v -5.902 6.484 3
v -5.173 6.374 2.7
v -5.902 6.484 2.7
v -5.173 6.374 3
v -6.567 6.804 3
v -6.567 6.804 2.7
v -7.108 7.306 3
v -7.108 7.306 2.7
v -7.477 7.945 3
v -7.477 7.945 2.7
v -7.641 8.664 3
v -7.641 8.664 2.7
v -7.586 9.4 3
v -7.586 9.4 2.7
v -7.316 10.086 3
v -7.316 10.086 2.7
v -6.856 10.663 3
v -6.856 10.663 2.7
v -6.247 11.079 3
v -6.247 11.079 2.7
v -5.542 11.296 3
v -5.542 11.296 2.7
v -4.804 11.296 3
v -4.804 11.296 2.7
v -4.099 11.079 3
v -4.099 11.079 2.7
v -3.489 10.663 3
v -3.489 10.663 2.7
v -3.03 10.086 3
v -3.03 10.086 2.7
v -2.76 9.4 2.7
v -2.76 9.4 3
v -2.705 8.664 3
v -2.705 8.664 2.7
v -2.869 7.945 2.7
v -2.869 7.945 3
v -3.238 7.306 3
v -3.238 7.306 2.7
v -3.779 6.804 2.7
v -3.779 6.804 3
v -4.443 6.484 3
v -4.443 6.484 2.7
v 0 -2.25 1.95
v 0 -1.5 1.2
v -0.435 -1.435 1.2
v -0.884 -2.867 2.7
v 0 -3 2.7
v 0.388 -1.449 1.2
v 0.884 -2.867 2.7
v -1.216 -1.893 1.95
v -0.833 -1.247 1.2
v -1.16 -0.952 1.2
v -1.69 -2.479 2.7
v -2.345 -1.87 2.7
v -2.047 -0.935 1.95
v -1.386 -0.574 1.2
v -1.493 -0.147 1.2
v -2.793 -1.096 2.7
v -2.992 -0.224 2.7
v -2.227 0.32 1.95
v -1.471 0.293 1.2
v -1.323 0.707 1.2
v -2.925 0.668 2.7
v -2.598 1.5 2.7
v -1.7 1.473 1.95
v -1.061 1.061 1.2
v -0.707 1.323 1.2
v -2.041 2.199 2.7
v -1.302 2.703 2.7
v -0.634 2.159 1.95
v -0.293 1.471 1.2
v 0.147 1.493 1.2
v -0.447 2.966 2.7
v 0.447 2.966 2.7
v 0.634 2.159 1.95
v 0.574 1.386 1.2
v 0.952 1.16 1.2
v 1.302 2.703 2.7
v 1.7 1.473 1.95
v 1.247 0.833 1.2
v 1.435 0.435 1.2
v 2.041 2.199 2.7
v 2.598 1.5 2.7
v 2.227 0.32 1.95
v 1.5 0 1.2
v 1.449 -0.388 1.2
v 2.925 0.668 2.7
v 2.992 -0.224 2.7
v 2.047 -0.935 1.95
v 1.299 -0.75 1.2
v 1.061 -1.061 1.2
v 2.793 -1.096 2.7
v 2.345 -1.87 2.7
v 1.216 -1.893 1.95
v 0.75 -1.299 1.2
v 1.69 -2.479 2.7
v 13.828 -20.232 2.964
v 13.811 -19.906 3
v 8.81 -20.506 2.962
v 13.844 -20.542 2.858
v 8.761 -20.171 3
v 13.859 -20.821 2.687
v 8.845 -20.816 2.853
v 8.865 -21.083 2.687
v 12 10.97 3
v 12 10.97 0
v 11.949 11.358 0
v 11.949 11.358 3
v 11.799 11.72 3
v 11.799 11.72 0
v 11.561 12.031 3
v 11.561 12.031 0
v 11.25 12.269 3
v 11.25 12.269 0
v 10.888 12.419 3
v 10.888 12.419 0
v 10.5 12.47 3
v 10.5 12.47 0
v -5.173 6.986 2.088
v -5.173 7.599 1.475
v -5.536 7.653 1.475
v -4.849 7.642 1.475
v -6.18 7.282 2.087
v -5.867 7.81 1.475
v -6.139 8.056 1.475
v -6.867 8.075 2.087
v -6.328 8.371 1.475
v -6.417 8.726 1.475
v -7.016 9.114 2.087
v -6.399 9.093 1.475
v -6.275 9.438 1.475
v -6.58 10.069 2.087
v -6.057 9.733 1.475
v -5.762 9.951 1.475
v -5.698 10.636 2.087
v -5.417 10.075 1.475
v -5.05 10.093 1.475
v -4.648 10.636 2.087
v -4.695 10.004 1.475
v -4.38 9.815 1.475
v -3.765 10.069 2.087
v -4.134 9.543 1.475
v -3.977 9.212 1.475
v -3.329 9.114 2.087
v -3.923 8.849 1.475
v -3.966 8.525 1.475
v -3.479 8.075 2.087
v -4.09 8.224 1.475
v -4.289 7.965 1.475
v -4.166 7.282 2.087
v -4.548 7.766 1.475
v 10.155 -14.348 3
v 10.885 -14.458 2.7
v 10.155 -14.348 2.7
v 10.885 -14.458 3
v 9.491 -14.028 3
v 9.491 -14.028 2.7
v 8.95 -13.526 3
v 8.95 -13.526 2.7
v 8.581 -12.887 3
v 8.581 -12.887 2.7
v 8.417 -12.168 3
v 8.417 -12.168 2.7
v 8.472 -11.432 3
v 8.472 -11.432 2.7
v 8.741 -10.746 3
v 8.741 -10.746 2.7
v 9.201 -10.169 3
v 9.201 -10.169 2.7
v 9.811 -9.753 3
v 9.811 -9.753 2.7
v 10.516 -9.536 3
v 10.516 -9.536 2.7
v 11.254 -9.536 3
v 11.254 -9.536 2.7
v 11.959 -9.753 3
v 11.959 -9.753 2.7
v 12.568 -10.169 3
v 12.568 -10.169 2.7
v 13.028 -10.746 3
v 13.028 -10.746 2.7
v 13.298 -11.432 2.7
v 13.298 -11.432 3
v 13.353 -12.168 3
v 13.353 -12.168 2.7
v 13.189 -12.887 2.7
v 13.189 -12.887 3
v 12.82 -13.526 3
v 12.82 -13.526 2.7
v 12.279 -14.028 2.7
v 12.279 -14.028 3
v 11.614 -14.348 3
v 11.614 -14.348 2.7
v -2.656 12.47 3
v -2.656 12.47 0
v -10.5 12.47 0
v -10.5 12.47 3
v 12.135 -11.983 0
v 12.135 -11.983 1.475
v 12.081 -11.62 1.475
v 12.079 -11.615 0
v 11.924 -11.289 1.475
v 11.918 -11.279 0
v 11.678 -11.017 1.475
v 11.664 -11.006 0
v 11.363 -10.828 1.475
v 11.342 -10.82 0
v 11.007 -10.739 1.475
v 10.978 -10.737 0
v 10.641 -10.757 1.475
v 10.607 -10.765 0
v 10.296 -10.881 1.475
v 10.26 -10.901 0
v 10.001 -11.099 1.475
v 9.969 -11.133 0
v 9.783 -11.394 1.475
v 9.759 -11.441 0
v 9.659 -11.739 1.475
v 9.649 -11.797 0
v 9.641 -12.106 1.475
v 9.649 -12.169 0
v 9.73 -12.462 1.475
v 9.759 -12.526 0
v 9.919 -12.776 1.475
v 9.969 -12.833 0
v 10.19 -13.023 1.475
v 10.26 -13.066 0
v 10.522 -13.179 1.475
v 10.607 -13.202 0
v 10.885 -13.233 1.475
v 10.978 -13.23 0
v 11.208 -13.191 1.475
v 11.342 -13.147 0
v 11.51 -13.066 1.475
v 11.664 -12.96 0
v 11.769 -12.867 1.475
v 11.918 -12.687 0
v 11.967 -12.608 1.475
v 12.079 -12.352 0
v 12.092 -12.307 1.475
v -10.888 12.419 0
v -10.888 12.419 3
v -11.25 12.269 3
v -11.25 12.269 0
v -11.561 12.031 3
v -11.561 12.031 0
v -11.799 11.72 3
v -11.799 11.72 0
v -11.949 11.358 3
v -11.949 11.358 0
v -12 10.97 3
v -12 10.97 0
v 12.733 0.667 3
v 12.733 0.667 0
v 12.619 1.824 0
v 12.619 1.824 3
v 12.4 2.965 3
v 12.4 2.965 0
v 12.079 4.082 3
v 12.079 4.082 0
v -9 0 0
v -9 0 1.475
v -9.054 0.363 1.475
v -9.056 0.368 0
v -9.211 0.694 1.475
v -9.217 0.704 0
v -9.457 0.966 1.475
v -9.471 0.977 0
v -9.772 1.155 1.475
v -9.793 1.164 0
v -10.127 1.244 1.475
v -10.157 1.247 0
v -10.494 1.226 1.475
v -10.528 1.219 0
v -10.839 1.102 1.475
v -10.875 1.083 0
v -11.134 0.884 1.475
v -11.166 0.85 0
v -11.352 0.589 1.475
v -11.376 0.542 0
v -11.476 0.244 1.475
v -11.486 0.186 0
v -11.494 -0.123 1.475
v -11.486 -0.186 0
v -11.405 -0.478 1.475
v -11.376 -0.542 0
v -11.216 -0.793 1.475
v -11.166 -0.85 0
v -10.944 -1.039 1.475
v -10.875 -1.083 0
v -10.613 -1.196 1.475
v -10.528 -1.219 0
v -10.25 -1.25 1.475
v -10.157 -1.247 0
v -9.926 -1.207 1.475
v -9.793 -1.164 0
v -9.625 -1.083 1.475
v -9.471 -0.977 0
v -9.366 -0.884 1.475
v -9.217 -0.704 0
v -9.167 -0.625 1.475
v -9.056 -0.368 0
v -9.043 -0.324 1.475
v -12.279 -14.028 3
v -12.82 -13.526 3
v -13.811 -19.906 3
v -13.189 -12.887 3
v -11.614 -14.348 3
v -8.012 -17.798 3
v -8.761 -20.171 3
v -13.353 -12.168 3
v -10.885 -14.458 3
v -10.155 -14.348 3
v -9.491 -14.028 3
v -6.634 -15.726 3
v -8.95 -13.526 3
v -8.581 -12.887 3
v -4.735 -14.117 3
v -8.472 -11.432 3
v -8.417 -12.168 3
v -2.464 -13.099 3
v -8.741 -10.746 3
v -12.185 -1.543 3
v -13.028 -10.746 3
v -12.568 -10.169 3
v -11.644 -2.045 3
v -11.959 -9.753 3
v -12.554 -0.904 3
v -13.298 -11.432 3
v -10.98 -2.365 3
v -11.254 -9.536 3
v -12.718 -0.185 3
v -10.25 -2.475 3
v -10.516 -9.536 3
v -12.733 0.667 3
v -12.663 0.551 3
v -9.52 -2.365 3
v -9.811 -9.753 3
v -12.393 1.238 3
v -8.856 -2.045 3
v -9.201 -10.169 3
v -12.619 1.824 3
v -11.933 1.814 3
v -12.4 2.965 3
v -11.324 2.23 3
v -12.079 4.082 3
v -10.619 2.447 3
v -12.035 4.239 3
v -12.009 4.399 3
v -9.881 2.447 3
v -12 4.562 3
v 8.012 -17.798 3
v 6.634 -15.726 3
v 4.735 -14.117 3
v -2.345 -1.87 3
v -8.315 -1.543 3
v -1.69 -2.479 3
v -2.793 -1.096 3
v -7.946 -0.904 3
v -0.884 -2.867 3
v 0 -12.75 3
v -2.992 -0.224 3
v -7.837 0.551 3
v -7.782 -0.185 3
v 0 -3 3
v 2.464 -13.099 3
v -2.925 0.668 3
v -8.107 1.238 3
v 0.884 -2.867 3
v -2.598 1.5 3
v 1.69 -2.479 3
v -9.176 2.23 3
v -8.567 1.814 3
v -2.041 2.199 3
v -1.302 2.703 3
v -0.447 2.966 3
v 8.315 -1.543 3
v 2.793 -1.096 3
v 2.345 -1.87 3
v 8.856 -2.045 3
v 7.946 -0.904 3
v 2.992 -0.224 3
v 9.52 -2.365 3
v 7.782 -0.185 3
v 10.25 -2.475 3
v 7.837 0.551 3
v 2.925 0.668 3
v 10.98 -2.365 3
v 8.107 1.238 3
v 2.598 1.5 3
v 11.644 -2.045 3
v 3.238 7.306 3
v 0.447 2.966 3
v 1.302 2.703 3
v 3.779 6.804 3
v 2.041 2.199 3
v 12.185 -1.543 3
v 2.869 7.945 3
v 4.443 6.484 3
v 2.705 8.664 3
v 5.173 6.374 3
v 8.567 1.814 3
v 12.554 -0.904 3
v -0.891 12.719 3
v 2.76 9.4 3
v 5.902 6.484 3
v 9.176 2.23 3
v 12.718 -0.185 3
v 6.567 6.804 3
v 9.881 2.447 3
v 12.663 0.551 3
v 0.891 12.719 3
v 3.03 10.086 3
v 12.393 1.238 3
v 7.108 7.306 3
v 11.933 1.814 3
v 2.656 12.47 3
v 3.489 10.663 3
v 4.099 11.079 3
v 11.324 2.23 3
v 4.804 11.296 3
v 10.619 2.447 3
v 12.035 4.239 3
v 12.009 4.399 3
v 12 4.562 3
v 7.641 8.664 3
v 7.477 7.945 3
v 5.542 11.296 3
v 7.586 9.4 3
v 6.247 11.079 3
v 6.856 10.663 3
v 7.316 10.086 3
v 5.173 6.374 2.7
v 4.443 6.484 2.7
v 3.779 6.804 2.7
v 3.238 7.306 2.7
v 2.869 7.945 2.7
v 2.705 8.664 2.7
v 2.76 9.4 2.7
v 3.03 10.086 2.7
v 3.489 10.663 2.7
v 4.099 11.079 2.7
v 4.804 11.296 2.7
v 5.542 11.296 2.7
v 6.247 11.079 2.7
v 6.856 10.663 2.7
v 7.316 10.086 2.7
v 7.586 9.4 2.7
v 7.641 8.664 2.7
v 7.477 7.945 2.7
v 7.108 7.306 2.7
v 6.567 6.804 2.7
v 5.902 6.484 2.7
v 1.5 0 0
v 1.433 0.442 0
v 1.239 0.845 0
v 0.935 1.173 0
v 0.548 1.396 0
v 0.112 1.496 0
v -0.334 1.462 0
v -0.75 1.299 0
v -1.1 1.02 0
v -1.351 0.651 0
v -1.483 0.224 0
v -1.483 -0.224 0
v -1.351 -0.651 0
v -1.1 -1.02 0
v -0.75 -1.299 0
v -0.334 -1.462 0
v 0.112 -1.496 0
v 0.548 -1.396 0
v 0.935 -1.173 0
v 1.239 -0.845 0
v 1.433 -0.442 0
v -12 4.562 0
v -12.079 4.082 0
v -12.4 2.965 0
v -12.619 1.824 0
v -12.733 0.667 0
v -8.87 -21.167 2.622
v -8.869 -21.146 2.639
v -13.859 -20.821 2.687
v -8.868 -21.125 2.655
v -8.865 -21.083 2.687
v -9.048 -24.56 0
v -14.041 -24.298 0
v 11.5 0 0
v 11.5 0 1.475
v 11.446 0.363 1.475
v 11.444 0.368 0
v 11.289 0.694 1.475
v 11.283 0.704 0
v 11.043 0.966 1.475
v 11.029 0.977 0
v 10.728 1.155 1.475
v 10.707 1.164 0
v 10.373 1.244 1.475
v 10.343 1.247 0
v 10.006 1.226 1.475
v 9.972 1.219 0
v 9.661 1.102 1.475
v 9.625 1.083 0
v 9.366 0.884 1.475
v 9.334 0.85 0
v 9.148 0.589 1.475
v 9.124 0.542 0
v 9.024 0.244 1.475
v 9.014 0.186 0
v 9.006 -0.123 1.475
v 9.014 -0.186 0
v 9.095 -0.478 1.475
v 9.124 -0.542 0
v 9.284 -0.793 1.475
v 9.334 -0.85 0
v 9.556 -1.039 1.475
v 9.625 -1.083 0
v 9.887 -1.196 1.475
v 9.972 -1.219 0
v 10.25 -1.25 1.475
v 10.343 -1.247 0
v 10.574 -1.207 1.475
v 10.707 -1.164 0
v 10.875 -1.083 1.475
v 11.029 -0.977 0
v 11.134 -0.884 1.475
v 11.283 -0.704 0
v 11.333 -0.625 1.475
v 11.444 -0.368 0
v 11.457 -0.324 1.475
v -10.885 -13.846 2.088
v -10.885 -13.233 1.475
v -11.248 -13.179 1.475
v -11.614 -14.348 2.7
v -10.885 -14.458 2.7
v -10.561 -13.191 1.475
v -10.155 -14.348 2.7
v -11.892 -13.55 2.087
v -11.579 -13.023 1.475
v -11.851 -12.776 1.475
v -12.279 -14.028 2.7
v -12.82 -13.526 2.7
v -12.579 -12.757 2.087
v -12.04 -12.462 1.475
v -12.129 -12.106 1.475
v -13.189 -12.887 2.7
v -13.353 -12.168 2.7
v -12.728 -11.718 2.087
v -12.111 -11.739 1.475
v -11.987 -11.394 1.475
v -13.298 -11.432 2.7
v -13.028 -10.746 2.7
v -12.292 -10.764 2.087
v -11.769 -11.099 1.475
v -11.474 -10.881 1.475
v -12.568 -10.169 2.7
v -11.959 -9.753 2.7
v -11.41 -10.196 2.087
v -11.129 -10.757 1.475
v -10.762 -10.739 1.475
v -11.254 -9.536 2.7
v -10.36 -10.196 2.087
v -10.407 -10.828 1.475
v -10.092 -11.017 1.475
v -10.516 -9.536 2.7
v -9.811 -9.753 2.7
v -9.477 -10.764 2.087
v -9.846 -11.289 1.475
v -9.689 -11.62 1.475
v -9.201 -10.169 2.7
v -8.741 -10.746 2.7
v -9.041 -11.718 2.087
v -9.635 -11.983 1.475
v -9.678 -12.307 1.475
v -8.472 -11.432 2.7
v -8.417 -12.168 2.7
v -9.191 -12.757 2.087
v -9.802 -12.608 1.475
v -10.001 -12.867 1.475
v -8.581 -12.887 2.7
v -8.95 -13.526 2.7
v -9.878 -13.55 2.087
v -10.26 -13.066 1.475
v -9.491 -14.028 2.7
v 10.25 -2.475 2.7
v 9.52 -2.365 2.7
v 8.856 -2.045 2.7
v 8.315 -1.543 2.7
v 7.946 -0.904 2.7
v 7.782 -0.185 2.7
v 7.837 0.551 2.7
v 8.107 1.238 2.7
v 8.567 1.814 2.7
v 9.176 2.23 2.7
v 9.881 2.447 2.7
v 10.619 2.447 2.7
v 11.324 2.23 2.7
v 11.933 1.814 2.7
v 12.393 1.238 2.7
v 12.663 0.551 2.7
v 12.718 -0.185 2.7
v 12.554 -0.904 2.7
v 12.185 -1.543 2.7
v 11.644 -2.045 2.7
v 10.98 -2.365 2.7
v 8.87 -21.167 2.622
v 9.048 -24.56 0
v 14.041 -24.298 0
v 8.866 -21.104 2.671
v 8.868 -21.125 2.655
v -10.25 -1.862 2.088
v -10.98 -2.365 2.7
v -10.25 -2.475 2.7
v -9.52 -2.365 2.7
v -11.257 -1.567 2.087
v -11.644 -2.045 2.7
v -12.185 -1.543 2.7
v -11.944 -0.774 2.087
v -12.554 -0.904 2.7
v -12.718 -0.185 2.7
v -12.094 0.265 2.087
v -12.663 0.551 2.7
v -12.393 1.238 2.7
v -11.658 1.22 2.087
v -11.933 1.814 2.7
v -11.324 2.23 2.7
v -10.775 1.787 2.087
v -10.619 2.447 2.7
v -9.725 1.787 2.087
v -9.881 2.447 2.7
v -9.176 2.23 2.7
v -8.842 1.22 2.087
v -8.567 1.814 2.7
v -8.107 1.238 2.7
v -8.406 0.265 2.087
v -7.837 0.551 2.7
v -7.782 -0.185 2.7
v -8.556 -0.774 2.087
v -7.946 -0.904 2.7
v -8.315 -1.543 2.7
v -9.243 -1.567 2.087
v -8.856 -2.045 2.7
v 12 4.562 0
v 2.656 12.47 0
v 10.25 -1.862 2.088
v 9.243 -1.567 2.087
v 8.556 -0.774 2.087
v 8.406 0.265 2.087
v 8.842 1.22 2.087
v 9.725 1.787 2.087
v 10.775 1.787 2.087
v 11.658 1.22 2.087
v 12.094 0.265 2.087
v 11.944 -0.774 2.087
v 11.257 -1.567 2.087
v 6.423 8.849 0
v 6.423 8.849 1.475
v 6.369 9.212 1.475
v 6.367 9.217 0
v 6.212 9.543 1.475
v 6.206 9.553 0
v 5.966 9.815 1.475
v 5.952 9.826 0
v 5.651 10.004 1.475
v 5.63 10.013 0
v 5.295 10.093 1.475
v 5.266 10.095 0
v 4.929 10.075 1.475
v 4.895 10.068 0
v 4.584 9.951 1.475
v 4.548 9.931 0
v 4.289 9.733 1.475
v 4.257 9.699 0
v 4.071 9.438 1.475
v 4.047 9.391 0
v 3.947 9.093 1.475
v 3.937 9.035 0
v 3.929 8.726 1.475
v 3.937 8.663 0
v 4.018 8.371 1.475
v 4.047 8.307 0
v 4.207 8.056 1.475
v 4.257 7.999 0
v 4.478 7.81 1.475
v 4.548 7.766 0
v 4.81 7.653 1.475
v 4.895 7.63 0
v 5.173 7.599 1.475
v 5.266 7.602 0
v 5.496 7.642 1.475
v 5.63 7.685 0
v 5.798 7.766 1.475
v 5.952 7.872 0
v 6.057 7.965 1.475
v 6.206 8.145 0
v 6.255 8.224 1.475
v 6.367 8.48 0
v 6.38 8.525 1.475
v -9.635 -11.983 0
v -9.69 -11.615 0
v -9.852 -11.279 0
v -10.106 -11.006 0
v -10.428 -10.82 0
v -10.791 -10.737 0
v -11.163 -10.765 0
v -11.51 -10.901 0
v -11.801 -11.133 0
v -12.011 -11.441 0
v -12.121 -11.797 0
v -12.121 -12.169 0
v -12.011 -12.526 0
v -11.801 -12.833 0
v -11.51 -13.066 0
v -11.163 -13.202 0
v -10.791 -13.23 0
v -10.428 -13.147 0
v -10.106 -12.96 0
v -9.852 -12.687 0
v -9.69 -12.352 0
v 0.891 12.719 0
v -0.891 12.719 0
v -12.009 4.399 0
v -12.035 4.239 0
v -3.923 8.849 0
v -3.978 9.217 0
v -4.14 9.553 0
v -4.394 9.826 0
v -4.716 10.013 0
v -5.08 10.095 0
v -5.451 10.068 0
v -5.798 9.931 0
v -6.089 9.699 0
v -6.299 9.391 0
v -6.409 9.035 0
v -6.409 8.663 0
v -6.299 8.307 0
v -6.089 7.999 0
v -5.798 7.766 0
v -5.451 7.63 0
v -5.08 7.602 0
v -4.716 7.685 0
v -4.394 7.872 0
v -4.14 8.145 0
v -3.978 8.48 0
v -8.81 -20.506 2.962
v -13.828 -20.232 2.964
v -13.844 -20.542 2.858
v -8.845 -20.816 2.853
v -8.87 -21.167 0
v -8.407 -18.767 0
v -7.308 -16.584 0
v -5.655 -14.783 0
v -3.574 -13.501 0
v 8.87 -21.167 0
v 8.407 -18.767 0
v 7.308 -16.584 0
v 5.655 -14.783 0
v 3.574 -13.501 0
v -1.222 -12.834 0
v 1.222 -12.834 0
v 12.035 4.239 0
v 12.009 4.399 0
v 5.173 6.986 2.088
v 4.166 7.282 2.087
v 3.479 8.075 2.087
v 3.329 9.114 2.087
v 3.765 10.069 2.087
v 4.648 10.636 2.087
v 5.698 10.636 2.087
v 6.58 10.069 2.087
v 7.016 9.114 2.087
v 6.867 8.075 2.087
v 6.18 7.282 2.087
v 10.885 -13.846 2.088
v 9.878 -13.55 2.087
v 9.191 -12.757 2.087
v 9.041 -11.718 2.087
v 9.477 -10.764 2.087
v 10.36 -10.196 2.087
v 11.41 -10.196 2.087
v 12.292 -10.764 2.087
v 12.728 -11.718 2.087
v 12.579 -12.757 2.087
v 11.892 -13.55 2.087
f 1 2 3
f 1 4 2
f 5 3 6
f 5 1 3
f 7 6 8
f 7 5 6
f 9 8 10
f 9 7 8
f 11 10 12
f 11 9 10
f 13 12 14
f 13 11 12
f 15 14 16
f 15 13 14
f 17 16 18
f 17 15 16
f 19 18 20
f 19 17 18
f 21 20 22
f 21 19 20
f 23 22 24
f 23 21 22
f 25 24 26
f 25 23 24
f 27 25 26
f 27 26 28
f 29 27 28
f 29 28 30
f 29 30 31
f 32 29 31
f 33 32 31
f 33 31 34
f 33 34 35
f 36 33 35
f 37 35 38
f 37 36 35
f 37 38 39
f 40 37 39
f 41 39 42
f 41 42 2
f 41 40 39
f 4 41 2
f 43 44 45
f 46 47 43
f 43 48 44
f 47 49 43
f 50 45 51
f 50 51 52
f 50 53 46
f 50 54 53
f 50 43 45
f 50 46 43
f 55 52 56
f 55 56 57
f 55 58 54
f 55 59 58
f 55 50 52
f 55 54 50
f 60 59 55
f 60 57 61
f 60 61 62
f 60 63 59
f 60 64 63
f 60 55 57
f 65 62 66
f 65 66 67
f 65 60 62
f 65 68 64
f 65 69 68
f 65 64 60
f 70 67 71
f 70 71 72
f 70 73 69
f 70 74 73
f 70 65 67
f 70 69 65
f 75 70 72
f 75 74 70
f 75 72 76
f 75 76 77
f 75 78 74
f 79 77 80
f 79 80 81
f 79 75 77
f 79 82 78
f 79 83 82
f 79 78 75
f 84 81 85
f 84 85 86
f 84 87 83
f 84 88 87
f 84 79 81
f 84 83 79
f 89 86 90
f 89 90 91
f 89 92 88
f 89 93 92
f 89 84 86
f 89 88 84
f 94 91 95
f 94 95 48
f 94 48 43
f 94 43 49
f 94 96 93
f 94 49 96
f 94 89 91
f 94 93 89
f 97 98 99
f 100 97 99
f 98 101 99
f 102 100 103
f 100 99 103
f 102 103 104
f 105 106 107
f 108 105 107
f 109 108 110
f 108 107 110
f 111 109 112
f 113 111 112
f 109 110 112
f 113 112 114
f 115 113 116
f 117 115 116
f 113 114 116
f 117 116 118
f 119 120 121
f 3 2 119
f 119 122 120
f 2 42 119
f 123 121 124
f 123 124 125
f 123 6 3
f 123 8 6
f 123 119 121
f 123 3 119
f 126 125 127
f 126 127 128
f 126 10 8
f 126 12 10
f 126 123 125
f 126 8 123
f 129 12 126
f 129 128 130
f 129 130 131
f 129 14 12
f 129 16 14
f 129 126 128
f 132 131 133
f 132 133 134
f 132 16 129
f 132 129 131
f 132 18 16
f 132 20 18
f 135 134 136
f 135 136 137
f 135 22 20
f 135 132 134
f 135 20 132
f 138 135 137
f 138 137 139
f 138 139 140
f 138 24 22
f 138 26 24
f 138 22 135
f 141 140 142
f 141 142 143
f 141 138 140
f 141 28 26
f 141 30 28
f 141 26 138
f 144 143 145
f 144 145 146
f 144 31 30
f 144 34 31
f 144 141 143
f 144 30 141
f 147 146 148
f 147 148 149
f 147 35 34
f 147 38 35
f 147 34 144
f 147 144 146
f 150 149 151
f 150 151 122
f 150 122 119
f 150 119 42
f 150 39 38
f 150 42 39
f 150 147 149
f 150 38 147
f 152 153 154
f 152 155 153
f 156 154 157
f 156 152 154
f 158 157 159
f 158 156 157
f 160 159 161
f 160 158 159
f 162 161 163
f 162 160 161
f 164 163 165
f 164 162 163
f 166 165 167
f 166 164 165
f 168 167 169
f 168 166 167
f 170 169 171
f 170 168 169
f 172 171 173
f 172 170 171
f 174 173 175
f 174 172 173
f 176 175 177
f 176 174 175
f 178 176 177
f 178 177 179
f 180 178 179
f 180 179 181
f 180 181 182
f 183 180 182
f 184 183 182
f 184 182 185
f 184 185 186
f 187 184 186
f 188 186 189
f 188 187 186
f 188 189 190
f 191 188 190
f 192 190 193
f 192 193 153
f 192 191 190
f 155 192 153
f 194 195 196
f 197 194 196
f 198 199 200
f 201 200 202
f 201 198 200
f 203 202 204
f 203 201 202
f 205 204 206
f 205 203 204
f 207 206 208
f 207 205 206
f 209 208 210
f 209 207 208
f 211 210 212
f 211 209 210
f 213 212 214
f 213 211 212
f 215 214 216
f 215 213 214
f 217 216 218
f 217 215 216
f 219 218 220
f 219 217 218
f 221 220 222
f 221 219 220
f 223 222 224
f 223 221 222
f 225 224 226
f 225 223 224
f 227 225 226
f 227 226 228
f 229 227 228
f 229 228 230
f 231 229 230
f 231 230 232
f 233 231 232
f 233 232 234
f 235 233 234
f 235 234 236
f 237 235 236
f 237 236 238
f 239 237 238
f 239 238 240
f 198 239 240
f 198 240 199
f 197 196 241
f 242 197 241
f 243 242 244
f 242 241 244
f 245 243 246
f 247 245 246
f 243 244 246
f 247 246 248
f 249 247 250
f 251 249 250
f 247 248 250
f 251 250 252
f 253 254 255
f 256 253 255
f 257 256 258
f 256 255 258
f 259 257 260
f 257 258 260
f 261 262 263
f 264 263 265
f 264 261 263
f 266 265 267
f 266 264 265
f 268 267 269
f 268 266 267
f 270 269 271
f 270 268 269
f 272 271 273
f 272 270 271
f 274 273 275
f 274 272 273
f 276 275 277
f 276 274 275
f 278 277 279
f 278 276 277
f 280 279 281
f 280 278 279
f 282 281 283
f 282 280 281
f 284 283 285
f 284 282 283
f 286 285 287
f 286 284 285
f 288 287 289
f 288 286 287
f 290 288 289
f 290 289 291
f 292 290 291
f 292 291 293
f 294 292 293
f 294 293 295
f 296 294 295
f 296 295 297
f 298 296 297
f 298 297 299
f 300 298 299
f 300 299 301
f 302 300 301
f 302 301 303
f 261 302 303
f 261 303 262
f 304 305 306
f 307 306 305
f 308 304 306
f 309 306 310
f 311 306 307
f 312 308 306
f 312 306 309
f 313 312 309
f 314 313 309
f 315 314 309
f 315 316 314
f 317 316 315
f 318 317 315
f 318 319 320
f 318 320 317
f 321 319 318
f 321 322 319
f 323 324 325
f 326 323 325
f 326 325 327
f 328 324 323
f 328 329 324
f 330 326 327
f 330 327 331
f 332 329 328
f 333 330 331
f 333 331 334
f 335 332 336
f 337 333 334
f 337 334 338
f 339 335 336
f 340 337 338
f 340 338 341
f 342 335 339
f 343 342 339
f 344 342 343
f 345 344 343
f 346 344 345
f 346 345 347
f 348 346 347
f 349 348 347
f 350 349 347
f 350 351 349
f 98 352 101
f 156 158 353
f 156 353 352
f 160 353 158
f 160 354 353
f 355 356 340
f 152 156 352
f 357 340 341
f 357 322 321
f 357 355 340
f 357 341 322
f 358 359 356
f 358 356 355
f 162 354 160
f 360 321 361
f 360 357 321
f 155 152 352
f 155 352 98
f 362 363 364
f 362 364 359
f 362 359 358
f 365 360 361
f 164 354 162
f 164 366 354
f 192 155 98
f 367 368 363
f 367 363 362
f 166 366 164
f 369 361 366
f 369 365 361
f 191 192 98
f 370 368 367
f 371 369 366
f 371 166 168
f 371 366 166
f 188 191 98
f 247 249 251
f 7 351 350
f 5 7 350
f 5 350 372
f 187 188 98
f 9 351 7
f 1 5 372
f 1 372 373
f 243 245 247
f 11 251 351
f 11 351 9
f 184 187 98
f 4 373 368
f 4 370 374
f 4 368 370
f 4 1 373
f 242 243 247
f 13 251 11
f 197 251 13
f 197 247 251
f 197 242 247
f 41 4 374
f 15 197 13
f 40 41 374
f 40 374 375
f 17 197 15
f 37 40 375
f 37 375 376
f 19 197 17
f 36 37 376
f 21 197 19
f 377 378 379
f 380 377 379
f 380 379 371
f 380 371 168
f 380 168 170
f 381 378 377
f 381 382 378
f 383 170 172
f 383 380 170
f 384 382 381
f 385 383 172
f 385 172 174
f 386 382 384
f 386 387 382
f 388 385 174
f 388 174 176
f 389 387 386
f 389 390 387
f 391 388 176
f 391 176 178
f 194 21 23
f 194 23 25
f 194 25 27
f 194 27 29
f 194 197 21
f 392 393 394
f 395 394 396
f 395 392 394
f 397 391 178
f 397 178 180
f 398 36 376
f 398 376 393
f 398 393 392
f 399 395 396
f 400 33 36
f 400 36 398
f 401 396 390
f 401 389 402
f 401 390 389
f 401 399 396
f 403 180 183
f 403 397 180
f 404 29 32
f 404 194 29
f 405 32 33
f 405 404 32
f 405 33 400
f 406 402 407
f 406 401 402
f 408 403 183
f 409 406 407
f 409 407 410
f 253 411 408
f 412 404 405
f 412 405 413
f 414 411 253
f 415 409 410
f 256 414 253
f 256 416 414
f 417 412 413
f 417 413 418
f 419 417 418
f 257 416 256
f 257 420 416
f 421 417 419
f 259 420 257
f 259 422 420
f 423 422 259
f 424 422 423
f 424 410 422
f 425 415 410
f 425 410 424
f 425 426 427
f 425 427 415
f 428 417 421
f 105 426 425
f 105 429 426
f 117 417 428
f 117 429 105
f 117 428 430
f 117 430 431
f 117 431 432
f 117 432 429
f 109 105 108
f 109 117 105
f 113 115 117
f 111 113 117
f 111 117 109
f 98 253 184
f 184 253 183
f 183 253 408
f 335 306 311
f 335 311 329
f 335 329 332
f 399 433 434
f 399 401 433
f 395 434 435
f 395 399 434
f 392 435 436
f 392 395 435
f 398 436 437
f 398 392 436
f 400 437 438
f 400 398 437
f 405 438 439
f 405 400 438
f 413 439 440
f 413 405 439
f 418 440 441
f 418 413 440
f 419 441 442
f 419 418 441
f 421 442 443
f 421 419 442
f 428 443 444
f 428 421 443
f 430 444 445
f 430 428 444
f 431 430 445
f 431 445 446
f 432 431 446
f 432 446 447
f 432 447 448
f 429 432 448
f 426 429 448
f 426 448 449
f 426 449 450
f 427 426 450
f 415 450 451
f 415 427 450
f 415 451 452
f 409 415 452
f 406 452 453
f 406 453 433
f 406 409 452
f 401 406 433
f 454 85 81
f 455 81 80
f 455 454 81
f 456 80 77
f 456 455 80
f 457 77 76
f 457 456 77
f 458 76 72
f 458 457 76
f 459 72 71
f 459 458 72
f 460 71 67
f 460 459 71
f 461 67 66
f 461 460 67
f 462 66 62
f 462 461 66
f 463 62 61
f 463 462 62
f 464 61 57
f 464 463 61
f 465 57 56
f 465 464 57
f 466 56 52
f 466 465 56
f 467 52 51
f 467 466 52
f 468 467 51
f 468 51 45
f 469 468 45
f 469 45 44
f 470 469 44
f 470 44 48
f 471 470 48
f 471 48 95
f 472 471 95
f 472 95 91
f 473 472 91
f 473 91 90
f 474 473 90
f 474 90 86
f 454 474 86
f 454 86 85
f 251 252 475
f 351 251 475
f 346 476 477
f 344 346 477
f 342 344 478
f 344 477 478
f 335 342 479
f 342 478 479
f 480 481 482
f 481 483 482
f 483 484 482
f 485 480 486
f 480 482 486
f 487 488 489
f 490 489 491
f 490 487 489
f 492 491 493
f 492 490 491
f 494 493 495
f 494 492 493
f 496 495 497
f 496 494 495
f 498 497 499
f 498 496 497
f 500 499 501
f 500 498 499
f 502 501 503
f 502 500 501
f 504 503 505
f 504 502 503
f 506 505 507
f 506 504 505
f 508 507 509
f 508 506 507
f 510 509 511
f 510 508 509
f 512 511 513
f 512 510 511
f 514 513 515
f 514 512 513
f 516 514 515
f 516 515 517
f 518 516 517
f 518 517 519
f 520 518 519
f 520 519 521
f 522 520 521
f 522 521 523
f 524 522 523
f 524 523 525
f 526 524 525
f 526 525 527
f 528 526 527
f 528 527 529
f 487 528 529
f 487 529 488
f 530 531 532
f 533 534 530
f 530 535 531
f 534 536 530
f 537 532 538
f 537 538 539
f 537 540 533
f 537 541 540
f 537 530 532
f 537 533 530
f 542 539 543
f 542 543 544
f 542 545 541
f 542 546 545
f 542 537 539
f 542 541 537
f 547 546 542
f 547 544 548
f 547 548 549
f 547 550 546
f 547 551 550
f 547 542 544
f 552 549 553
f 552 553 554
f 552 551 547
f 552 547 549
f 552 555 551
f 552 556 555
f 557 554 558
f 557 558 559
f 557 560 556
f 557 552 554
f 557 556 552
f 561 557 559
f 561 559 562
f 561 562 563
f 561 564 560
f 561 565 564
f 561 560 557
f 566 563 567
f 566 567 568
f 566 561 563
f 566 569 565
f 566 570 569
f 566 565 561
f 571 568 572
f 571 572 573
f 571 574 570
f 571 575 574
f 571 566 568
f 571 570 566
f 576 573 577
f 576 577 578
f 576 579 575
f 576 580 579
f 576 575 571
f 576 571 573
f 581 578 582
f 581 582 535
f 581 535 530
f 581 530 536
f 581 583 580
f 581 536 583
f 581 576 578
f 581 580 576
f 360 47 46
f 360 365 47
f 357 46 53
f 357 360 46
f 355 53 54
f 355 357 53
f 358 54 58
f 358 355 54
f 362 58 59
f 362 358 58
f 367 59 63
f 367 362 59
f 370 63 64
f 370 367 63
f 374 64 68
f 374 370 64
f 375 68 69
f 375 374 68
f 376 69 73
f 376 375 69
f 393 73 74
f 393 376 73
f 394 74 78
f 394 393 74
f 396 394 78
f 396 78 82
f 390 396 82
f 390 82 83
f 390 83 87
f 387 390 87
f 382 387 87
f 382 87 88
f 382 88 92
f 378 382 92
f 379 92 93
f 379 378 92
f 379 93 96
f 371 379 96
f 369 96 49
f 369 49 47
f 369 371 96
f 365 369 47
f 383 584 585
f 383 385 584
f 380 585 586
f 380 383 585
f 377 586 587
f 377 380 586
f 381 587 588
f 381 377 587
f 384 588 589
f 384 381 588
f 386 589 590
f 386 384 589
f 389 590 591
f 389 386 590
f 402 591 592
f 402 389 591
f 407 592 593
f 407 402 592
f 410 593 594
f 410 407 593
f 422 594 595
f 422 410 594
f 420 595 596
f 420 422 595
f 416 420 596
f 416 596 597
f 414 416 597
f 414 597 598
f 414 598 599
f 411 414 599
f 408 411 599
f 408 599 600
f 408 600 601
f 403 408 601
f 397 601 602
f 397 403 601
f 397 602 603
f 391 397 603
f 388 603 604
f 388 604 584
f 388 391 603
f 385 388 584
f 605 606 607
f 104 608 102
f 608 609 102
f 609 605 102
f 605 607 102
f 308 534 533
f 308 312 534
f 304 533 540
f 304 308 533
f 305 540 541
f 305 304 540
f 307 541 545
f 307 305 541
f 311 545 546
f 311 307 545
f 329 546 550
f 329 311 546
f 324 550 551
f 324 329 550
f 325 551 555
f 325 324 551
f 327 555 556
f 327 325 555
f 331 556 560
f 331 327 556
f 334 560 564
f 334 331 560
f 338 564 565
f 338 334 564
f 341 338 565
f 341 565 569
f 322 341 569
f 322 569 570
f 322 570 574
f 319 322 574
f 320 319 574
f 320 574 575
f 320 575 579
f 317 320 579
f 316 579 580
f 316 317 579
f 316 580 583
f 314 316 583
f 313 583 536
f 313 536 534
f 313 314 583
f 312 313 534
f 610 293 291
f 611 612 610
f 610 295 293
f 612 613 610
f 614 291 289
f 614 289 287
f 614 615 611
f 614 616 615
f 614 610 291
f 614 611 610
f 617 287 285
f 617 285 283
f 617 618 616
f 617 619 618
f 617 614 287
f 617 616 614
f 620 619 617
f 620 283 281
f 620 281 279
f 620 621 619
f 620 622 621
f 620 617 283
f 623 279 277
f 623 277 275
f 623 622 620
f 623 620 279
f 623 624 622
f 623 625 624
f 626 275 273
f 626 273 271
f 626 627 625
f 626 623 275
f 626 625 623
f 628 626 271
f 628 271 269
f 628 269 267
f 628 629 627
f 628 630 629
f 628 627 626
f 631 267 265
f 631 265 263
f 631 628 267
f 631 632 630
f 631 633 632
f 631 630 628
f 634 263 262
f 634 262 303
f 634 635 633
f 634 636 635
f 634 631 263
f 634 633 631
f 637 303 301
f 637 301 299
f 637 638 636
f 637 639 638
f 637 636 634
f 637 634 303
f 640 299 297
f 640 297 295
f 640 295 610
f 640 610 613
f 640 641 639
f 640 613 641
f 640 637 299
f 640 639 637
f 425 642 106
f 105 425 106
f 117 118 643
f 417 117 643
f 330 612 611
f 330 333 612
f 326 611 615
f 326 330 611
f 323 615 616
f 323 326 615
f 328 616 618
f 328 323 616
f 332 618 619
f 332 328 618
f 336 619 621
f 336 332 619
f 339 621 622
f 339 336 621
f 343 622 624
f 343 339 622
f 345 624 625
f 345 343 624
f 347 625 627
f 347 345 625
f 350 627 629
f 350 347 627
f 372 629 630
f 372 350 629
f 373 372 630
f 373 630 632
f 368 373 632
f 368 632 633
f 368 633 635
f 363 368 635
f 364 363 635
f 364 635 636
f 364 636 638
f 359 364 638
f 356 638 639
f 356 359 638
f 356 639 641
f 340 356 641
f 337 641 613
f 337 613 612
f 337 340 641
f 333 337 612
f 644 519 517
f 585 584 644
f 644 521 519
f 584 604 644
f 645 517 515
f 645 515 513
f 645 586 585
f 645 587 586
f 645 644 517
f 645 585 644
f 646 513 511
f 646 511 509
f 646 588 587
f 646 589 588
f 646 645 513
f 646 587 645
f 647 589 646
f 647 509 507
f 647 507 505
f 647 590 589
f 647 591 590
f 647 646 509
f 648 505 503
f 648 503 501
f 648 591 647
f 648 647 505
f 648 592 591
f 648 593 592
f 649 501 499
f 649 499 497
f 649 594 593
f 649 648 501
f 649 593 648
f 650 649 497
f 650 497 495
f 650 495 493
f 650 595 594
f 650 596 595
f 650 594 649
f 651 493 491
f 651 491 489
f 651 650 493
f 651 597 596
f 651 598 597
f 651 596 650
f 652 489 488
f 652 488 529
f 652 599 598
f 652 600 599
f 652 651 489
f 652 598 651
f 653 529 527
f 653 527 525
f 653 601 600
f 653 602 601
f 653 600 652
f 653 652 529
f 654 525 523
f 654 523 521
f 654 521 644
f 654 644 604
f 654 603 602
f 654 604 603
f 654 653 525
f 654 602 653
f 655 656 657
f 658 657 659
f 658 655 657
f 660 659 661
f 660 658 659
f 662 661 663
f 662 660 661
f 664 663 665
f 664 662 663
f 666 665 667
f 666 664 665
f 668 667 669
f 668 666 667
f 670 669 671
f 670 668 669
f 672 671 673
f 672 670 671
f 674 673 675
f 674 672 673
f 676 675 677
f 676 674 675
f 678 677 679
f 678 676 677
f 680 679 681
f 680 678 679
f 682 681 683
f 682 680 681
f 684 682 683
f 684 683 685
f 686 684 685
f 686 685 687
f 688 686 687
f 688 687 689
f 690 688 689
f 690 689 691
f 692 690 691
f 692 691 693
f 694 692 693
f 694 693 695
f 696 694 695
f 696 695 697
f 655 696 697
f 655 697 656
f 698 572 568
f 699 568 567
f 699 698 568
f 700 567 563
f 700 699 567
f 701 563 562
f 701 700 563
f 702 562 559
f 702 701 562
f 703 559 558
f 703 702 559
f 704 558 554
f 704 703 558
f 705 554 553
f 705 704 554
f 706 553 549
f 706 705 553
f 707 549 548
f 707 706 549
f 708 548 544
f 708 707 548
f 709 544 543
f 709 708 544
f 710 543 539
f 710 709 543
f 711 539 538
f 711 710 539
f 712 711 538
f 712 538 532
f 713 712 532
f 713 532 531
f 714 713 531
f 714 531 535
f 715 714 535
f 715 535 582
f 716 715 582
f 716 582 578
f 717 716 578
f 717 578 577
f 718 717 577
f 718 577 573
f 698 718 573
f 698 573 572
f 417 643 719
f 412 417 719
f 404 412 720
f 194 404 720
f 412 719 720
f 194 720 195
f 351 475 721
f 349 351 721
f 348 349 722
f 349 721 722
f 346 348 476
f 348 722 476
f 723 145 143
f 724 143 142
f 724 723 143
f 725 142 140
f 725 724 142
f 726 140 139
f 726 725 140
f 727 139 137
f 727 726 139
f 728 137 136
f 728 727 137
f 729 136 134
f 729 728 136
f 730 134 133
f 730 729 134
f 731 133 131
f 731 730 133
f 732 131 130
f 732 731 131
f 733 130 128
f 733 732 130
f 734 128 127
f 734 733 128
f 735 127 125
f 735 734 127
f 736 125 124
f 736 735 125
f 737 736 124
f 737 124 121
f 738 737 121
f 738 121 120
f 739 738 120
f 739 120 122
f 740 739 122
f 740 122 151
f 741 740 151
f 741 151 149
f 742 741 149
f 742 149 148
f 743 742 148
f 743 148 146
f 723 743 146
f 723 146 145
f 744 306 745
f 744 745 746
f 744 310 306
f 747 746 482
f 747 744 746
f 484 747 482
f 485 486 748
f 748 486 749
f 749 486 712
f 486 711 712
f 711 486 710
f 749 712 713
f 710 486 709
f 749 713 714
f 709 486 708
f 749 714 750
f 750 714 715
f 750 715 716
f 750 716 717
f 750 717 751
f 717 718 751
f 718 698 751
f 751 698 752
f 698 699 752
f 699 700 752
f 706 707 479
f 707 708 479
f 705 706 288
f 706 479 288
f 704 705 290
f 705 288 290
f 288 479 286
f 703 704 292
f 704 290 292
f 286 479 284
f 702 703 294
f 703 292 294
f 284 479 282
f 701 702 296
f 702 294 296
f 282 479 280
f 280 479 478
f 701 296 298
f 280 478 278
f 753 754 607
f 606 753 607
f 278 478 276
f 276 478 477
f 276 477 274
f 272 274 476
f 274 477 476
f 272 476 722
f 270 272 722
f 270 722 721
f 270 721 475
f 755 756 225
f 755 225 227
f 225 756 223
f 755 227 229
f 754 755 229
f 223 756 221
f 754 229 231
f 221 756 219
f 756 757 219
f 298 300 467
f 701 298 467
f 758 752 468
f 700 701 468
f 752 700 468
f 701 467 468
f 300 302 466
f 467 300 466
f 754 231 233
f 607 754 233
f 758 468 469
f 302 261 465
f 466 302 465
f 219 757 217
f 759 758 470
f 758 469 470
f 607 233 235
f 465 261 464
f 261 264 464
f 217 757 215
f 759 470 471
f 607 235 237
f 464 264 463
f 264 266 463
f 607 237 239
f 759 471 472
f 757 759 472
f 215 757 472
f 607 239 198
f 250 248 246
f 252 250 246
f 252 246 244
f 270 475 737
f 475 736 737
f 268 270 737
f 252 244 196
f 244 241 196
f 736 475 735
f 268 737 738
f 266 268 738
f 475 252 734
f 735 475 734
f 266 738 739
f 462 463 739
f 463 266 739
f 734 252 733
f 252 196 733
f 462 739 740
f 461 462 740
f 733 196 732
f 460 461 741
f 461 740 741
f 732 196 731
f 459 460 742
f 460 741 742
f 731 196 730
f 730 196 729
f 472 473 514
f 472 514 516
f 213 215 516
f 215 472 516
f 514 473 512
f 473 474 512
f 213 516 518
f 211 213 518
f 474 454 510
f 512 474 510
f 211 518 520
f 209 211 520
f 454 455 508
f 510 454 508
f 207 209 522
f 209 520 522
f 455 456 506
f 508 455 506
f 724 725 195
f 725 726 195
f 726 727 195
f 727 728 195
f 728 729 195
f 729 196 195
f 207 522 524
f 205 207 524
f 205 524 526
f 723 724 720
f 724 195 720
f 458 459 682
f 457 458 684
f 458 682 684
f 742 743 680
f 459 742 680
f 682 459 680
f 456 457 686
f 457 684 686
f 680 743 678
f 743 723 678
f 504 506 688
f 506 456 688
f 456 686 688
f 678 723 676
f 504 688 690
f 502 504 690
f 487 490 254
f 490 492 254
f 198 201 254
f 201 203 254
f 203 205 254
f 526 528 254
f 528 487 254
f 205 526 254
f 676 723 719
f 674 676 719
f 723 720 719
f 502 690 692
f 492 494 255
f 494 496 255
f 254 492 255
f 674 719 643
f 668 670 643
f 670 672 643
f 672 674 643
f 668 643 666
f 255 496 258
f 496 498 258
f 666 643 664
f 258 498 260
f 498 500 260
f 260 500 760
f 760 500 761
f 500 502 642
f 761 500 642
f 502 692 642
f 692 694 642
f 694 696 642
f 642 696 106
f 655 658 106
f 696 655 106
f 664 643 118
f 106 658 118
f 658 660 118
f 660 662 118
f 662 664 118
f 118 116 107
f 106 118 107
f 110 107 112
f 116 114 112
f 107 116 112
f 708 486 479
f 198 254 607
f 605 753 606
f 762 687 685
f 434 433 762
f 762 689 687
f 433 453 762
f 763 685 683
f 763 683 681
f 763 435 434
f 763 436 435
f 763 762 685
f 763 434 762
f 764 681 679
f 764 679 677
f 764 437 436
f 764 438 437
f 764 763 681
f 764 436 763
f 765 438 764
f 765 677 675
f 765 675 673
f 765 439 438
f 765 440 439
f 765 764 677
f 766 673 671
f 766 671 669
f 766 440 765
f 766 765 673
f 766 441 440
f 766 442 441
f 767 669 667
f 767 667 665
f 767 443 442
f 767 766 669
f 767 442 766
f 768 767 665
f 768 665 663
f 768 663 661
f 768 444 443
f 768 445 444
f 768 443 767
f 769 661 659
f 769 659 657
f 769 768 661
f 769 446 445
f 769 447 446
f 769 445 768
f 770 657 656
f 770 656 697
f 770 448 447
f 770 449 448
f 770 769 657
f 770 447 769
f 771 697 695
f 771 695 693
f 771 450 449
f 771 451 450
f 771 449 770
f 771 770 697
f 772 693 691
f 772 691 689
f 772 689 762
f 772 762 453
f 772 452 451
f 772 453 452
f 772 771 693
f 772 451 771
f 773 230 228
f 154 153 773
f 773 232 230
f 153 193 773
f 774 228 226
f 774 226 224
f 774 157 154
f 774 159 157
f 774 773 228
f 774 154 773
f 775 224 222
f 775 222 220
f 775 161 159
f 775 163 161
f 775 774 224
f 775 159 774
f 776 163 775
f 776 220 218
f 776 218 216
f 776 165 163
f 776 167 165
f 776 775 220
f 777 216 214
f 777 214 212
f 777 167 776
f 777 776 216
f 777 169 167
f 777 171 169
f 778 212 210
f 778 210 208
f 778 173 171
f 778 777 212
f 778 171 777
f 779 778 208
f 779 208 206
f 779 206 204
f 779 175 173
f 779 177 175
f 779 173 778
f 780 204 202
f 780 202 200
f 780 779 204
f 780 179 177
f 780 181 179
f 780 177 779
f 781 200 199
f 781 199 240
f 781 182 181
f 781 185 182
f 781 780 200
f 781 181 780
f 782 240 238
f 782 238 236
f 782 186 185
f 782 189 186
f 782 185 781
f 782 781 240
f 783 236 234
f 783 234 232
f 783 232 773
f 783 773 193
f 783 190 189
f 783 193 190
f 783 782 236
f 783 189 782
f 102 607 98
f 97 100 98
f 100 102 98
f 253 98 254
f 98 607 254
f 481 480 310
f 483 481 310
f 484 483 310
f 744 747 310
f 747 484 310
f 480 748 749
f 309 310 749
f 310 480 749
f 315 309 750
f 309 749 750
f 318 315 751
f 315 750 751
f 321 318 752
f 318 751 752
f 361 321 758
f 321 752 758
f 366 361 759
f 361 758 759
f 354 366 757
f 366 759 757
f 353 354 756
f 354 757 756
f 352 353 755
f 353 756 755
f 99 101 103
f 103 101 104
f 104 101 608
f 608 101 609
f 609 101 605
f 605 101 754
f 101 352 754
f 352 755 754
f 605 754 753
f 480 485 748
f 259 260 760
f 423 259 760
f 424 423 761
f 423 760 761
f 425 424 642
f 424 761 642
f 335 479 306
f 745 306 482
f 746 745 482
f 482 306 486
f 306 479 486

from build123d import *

# Parameters (mm, degrees)
SKETCH1_R                                      = 1.25
SKETCH1_R_2                                    = 1.5
BOSS_EXTRUDE1_DEPTH                            = 3
CSK_FOR_M2_5_FLAT_HEAD_MACHINE_SCREW2_AT_COUNT = 2
CSK_FOR_M2_5_FLAT_HEAD_MACHINE_SCREW2_AT_PITCH = 10.201972061
CSK_FOR_M2_5_FLAT_HEAD_MACHINE_SCREW_2_COUNT   = 2
CSK_FOR_M2_5_FLAT_HEAD_MACHINE_SCREW_2_PITCH   = 17.781163237
CSK_FOR_M2_5_FLAT_HEAD_MACHINE_SCREW_3_COUNT   = 2
CSK_FOR_M2_5_FLAT_HEAD_MACHINE_SCREW_3_PITCH   = 20.5
CSK_FOR_M2_5_FLAT_HEAD_MACHINE_SCREW_4_COUNT   = 2
CSK_FOR_M2_5_FLAT_HEAD_MACHINE_SCREW_4_PITCH   = 12
CSK_FOR_M2_5_FLAT_HEAD_MACHINE_SCREW_5_COUNT   = 2
CSK_FOR_M2_5_FLAT_HEAD_MACHINE_SCREW_5_PITCH   = 24.295707673
CUT_EXTRUDE4_REACH                             = 38.909
CUT_EXTRUDE5_REACH                             = 38.909
FILLET2_R                                      = 1.5


with BuildPart() as part:
    # Sketch1 → Boss-Extrude1 (new body)
    with BuildSketch(Plane.XY):
        with BuildLine():
            ThreePointArc((12.078947368, 4.081853803), (12.019868427, 4.318739766), (12, 4.562071898))
            Line((12, 4.562071898), (12, 10.970231229))
            ThreePointArc((12, 10.970231229), (11.560660172, 12.030891401), (10.5, 12.470231229))
            Line((10.5, 12.470231229), (2.656281818, 12.470231229))
            ThreePointArc((2.656281818, 12.470231229), (0, 12.75), (-2.656281818, 12.470231229))
            Line((-2.656281818, 12.470231229), (-10.5, 12.470231229))
            ThreePointArc((-10.5, 12.470231229), (-11.560660172, 12.030891401), (-12, 10.970231229))
            Line((-12, 10.970231229), (-12, 4.562071898))
            ThreePointArc((-12, 4.562071898), (-12.019868427, 4.318739766), (-12.078947368, 4.081853803))
            ThreePointArc((-12.078947368, 4.081853803), (-12.522664749, 2.396949642), (-12.732526568, 0.667283442))
            Line((-12.732526568, 0.667283442), (-14.040925474, -24.298454927))
            Line((-14.040925474, -24.298454927), (-9.0477778, -24.560134708))
            Line((-9.0477778, -24.560134708), (-8.869966, -21.167283442))
            ThreePointArc((-8.869966, -21.167283442), (0, -12.75), (8.869966, -21.167283442))
            Line((8.869966, -21.167283442), (9.0477778, -24.560134708))
            Line((9.0477778, -24.560134708), (14.040925474, -24.298454927))
            Line((14.040925474, -24.298454927), (12.732526568, 0.667283442))
            ThreePointArc((12.732526568, 0.667283442), (12.522664749, 2.396949642), (12.078947368, 4.081853803))
        make_face()
        with Locations((5.172915418, 8.848923442)):
            Circle(SKETCH1_R, mode=Mode.SUBTRACT)
        with Locations((10.25, 0)):
            Circle(SKETCH1_R, mode=Mode.SUBTRACT)
        with Locations((10.884912472, -11.983191818)):
            Circle(SKETCH1_R, mode=Mode.SUBTRACT)
        Circle(SKETCH1_R_2, mode=Mode.SUBTRACT)
        with Locations((-10.25, 0)):
            Circle(SKETCH1_R, mode=Mode.SUBTRACT)
        with Locations((-5.172915418, 8.848923442)):
            Circle(SKETCH1_R, mode=Mode.SUBTRACT)
        with Locations((-10.884912472, -11.983191818)):
            Circle(SKETCH1_R, mode=Mode.SUBTRACT)
    extrude(amount=BOSS_EXTRUDE1_DEPTH)

    # Sketch3 → CSK for M3 Flat Head Machine Screw1 (revolve, cut)
    with BuildSketch(Plane(origin=(0, 0, 3), x_dir=(0, -1, 0), z_dir=(1, 0, 0))):
        Polygon((0, 0), (0, 5.901290929), (1.5, 5), (1.5, 1.8), (3, 0.3), (3, 0), align=None)
    revolve(axis=Axis((0, 0, 9.35), (0, 0, -1)), mode=Mode.SUBTRACT)

    # Sketch6 → CSK for M2.5 Flat Head Machine Screw2 (revolve, cut)
    with BuildSketch(Plane(origin=(-10.25, 0, 3), x_dir=(0, -1, 0), z_dir=(1, 0, 0))):
        Polygon((0, 0), (0, 5.751075774), (1.25, 5), (1.25, 1.525), (2.475, 0.3), (2.475, 0), align=None)
    csk_for_m2_5_flat_head_machine_screw2 = revolve(axis=Axis((-10.25, 0, 9.35), (0, 0, -1)), mode=Mode.SUBTRACT)

    # CSK for M2.5 Flat Head Machine Screw2 at: CSK for M2.5 Flat Head Machine Screw2 ×2
    with Locations(*[Vector(0.4976571736965763, 0.8673738164530538, 0) * (i * CSK_FOR_M2_5_FLAT_HEAD_MACHINE_SCREW2_AT_PITCH) for i in range(1, CSK_FOR_M2_5_FLAT_HEAD_MACHINE_SCREW2_AT_COUNT)]):
        add(csk_for_m2_5_flat_head_machine_screw2, mode=Mode.SUBTRACT)

    # CSK for M2.5 Flat Head Machine Screw 2: CSK for M2.5 Flat Head Machine Screw2 ×2
    with Locations(*[Vector(0.8673738164530539, 0.497657173696576, 0) * (i * CSK_FOR_M2_5_FLAT_HEAD_MACHINE_SCREW_2_PITCH) for i in range(1, CSK_FOR_M2_5_FLAT_HEAD_MACHINE_SCREW_2_COUNT)]):
        add(csk_for_m2_5_flat_head_machine_screw2, mode=Mode.SUBTRACT)

    # CSK for M2.5 Flat Head Machine Screw 3: CSK for M2.5 Flat Head Machine Screw2 ×2
    with Locations(*[(i * CSK_FOR_M2_5_FLAT_HEAD_MACHINE_SCREW_3_PITCH, 0, 0) for i in range(1, CSK_FOR_M2_5_FLAT_HEAD_MACHINE_SCREW_3_COUNT)]):
        add(csk_for_m2_5_flat_head_machine_screw2, mode=Mode.SUBTRACT)

    # CSK for M2.5 Flat Head Machine Screw 4: CSK for M2.5 Flat Head Machine Screw2 ×2
    with Locations(*[Vector(-0.05290937262723391, -0.9985993181893289, 0) * (i * CSK_FOR_M2_5_FLAT_HEAD_MACHINE_SCREW_4_PITCH) for i in range(1, CSK_FOR_M2_5_FLAT_HEAD_MACHINE_SCREW_4_COUNT)]):
        add(csk_for_m2_5_flat_head_machine_screw2, mode=Mode.SUBTRACT)

    # CSK for M2.5 Flat Head Machine Screw 5: CSK for M2.5 Flat Head Machine Screw2 ×2
    with Locations(*[Vector(0.8699031432206916, -0.4932225881027359, 0) * (i * CSK_FOR_M2_5_FLAT_HEAD_MACHINE_SCREW_5_PITCH) for i in range(1, CSK_FOR_M2_5_FLAT_HEAD_MACHINE_SCREW_5_COUNT)]):
        add(csk_for_m2_5_flat_head_machine_screw2, mode=Mode.SUBTRACT)

    # Sketch10 → Cut-Extrude4 (cut, up to next)
    with BuildSketch(Plane(origin=(12.732526568, 0.667283442, 0), x_dir=(0, 0, -1), z_dir=(0.9986295347545739, 0.052335956242944286, 0)), mode=Mode.PRIVATE) as cut_extrude4_sk1:
        Polygon((-3, -25), (0, -25), (-3, -21.113156261), align=None)
    cut_extrude4_tool1 = extrude(cut_extrude4_sk1.sketch, amount=-CUT_EXTRUDE4_REACH, mode=Mode.PRIVATE) & part.part
    add(cut_extrude4_tool1.solids().sort_by_distance((13.973118, -23.004616, 2))[0], mode=Mode.SUBTRACT)

    # Sketch11 → Cut-Extrude5 (cut, up to next)
    with BuildSketch(Plane(origin=(-12.732526568, 0.667283442, 0), x_dir=(0, 0, 1), z_dir=(-0.9986295347545739, 0.052335956242944716, 0)), mode=Mode.PRIVATE) as cut_extrude5_sk1:
        Polygon((3, -21.113156261), (0, -25), (3, -25), align=None)
    cut_extrude5_tool1 = extrude(cut_extrude5_sk1.sketch, amount=-CUT_EXTRUDE5_REACH, mode=Mode.PRIVATE) & part.part
    add(cut_extrude5_tool1.solids().sort_by_distance((-13.973118, -23.004616, 2))[0], mode=Mode.SUBTRACT)

    # Fillet2
    fillet2_edges = [part.edges().sort_by_distance(p)[0] for p in [
        (11.334194425, -20.548130857, 3),
        (-11.334194425, -20.548130857, 3),
    ]]
    fillet(fillet2_edges, radius=FILLET2_R)


solid = part.part
